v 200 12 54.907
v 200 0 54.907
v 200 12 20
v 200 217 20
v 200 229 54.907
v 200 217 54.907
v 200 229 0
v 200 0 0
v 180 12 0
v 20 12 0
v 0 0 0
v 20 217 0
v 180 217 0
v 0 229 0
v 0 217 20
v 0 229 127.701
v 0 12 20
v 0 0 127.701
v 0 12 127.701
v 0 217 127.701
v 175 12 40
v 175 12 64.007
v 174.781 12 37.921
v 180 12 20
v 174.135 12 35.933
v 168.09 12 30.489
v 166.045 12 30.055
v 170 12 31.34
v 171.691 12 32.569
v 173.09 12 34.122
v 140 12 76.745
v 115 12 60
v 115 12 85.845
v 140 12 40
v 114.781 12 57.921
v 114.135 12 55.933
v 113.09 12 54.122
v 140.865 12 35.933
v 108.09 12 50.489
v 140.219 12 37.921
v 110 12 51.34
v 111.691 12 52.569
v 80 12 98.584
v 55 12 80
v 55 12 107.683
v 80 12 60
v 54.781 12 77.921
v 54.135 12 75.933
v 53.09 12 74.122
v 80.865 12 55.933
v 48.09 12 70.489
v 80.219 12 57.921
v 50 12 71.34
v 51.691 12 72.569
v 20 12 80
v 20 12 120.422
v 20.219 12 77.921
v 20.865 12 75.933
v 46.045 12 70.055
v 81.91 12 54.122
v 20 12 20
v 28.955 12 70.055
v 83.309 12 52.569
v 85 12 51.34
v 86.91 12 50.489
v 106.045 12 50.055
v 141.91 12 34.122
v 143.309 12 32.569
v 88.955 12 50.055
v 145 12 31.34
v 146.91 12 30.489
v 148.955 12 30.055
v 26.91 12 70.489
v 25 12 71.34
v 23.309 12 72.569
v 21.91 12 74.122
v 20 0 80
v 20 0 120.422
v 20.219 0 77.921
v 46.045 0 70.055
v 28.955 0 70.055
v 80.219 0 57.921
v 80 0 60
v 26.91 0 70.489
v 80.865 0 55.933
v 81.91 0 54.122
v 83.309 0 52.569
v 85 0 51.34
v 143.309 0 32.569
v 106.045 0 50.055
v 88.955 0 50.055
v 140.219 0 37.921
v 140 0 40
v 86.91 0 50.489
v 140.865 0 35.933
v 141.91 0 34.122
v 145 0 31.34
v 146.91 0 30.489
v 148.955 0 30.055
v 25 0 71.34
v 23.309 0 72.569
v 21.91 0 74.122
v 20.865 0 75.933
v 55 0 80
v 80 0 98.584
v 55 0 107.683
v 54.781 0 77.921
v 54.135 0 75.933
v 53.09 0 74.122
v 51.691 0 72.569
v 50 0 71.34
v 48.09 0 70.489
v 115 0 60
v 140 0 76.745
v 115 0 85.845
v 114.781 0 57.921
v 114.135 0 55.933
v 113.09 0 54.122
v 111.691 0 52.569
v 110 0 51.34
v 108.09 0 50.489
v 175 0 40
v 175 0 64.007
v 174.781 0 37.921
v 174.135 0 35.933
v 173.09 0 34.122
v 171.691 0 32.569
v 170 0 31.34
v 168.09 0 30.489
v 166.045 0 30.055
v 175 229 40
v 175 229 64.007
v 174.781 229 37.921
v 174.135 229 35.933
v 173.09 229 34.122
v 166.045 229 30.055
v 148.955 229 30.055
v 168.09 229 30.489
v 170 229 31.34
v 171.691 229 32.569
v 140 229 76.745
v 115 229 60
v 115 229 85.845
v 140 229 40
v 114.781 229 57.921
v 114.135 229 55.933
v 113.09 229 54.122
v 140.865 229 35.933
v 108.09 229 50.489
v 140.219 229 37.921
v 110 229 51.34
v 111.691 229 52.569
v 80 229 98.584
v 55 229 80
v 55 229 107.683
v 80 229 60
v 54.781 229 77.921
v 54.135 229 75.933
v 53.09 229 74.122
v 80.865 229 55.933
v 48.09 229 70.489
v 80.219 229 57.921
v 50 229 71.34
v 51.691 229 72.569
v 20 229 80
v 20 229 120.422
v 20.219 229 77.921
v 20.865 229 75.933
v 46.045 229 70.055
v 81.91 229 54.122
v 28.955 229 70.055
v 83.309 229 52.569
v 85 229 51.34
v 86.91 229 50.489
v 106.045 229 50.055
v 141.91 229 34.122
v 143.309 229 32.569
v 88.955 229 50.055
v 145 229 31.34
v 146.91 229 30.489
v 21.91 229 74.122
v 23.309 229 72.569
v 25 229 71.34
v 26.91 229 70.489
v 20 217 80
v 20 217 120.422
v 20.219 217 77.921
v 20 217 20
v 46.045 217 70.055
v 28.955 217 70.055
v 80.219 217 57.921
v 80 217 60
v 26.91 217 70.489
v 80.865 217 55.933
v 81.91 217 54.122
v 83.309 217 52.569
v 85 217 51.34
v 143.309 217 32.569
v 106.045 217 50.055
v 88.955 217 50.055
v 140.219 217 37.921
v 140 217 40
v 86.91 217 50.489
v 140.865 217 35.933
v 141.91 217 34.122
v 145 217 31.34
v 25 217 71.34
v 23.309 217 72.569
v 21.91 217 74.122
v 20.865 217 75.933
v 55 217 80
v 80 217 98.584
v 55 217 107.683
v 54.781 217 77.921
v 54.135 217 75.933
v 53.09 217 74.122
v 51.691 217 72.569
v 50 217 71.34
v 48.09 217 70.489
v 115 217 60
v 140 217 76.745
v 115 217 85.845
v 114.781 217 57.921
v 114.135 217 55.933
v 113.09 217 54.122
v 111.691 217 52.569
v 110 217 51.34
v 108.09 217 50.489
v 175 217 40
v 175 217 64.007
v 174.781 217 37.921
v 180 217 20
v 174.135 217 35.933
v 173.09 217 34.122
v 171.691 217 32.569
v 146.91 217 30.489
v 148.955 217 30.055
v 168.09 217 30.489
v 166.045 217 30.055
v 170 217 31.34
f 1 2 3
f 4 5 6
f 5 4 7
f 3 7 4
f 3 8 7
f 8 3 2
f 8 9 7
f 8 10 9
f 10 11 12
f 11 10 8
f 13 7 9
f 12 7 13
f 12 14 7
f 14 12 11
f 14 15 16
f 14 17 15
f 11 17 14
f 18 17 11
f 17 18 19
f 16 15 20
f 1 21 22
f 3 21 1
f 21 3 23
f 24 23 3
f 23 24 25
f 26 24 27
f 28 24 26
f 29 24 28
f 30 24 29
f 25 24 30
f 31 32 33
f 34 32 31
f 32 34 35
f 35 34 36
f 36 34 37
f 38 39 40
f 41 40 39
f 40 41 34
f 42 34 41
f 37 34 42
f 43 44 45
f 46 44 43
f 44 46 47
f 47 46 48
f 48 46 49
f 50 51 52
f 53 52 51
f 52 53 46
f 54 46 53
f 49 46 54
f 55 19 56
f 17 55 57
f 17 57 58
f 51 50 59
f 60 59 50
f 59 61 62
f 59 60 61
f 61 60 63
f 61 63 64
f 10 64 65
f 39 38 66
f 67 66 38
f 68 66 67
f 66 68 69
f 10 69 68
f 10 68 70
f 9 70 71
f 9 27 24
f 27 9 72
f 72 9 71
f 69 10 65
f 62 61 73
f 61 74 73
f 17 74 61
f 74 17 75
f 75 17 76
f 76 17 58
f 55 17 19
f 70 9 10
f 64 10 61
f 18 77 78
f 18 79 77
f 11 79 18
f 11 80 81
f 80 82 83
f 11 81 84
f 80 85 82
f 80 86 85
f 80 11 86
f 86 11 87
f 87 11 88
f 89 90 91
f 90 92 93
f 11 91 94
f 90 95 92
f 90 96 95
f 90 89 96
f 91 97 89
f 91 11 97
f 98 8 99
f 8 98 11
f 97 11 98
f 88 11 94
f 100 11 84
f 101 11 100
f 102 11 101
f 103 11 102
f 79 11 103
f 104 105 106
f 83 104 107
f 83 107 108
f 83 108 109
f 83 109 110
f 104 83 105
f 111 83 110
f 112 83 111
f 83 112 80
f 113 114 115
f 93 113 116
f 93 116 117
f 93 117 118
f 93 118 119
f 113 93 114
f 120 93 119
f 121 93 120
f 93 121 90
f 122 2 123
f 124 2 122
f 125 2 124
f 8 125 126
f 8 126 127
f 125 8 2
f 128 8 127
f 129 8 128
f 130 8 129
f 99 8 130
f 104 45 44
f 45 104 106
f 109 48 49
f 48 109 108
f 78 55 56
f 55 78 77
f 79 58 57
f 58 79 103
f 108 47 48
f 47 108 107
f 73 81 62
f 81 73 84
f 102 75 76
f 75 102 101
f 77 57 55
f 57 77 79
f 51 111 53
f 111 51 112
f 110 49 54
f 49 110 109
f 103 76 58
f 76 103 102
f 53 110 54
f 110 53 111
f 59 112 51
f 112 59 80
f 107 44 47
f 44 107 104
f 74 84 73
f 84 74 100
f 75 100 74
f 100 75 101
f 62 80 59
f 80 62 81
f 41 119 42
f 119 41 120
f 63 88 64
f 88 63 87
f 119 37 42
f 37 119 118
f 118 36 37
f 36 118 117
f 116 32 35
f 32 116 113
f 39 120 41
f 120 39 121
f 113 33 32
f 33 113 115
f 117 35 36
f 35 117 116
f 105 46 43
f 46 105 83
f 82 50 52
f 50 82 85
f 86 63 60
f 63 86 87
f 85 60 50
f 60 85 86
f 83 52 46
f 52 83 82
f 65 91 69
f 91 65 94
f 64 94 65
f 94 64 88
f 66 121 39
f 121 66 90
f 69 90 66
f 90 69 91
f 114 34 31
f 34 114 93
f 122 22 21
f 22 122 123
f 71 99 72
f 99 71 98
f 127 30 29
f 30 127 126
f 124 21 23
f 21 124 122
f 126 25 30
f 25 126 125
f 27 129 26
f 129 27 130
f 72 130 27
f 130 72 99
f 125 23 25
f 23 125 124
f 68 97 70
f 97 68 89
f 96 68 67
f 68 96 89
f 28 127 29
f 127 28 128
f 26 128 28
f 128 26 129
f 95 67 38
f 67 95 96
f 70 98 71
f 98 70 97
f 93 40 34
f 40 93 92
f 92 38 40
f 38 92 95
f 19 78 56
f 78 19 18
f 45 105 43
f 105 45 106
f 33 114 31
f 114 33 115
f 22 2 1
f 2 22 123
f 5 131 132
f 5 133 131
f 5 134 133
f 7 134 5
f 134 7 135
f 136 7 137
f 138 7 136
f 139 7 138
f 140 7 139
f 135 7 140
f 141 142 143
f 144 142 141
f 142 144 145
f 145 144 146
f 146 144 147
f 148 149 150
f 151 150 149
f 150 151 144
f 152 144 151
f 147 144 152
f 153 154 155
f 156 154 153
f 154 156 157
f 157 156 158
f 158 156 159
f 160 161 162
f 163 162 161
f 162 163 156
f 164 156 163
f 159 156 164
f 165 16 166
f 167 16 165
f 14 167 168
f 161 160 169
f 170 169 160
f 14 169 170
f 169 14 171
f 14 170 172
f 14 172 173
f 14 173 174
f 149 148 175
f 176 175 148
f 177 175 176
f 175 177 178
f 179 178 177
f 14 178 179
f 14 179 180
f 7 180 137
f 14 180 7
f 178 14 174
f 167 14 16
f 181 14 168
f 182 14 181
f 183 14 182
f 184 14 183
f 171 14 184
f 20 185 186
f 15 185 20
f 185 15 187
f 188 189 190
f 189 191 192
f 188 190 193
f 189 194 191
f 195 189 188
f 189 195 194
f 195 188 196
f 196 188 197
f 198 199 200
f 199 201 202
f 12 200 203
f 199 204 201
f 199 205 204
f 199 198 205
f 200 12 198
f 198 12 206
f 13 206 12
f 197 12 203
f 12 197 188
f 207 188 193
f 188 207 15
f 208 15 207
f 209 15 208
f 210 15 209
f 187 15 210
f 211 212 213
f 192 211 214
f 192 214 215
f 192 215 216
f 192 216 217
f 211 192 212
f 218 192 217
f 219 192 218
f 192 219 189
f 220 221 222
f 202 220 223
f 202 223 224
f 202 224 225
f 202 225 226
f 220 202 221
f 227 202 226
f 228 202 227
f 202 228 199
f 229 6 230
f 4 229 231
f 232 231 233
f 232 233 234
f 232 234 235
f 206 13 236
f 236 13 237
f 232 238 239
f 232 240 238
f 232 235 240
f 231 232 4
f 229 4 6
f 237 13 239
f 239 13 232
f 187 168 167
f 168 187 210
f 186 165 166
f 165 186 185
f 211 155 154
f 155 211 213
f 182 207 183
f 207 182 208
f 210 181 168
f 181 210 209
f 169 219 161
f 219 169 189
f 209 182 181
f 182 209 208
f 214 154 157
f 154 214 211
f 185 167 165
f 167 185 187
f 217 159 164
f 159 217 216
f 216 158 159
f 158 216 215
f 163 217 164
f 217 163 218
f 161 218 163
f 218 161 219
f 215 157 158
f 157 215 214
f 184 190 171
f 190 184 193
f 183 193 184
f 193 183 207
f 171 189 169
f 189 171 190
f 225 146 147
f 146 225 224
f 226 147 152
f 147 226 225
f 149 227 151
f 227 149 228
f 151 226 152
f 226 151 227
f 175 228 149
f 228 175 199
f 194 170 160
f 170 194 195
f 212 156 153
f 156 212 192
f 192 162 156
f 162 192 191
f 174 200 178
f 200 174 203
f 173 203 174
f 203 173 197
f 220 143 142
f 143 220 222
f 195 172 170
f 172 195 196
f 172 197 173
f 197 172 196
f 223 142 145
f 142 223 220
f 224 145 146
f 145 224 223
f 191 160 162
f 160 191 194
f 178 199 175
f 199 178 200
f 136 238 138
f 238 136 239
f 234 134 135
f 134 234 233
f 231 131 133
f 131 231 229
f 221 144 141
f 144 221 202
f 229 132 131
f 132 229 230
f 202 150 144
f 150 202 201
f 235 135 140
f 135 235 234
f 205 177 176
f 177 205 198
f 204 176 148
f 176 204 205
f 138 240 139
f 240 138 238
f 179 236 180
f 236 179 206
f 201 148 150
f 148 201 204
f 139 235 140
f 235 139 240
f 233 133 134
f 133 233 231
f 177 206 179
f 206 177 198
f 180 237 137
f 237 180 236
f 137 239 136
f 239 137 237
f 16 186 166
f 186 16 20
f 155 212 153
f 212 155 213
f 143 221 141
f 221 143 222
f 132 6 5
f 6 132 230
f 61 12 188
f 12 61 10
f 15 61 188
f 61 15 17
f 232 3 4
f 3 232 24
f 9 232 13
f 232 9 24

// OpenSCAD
tl=200;
mxh=150;
thk=12;
cutw=15;
cuth=210;
cuttk=thk+5;
numcuts=3;
dbs=217;



difference()
{
   cube([tl,thk,mxh]);




//first cutout
   minkowski(){   
   translate([30,-2,80]) cube([cutw,cuttk,cuth]);
       sphere(10);
   }
//second cut
 minkowski(){   
   translate([90,-2,60]) cube([cutw,cuttk,cuth]);
       sphere(10);
   }  
 minkowski(){   
   translate([150,-2,40]) cube([cutw,cuttk,cuth]);
       sphere(10);
   }  
  rotate([0,20,0]) translate([-55,-4,120]) cube([230,17,170]);
}

//second plate
difference()
{
translate([0,dbs,0])   cube([tl,thk,mxh]);




//first cutout
   minkowski(){   
   translate([30,-2+dbs,80]) cube([cutw,cuttk,cuth]);
       sphere(10);
   }
//second cut
 minkowski(){   
   translate([90,-2+dbs,60]) cube([cutw,cuttk,cuth]);
       sphere(10);
   }  
 minkowski(){   
   translate([150,-2+dbs,40]) cube([cutw,cuttk,cuth]);
       sphere(10);
   }  
 rotate([0,20,0]) translate([-55,-4+dbs,120]) cube([230,17,170]);
}


cube([20,dbs,20]);

translate([tl-20,0,0])cube([20,dbs,20]);
